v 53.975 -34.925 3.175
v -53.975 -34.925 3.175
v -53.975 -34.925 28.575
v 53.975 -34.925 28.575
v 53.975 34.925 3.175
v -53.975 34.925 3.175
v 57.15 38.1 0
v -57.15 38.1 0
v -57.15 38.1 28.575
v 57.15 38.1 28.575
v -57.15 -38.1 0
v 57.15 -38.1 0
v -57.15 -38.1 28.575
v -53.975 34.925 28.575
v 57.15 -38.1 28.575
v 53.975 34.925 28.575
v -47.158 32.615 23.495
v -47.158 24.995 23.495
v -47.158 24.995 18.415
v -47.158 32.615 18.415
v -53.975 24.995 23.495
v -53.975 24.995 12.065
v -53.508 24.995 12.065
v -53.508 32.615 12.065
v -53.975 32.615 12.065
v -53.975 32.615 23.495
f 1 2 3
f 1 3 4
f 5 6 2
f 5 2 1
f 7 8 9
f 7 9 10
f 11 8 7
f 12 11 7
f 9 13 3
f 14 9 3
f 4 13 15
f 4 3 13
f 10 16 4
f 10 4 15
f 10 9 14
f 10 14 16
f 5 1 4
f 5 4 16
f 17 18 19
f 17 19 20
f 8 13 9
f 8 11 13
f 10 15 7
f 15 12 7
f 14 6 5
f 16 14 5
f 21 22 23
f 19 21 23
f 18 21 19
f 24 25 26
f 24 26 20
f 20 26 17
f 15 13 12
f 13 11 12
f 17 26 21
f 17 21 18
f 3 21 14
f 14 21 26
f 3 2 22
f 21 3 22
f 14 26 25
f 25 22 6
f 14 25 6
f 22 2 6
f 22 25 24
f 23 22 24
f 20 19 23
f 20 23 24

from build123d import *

# Parameters (mm, degrees)
F0_W     = 114.3
F0_H     = 76.2
F1_DEPTH = 3.175
F2_W     = 114.3
F2_H     = 76.2
F2_W_2   = 107.95
F2_H_2   = 69.85
F3_DEPTH = 25.4
F5_W     = 7.62
F5_H     = 7.62
F6_DEPTH = 11.43
F7_SIZE  = 6.35


with BuildPart() as f1:
    # F0 (on Top) → F1 (new body)
    with BuildSketch(Plane.XY):
        Rectangle(F0_W, F0_H)
    extrude(amount=F1_DEPTH)

    # F2 (on face) → F3 (join)
    with BuildSketch(Plane.XY.offset(3.175)):
        Rectangle(F2_W, F2_H)
        Rectangle(F2_W_2, F2_H_2, mode=Mode.SUBTRACT)
    extrude(amount=F3_DEPTH)

    # F5 (on offset) → F6 (join)
    with BuildSketch(Plane.XY.offset(23.495)):
        with Locations((-50.967861, 28.804621)):
            Rectangle(F5_W, F5_H)
    extrude(amount=-F6_DEPTH)

    # F7
    f7_edges = [f1.edges().sort_by_distance(p)[0] for p in [
        (-47.157861, 28.804621, 12.065),
    ]]
    chamfer(f7_edges, length=F7_SIZE)


solid = f1.part
